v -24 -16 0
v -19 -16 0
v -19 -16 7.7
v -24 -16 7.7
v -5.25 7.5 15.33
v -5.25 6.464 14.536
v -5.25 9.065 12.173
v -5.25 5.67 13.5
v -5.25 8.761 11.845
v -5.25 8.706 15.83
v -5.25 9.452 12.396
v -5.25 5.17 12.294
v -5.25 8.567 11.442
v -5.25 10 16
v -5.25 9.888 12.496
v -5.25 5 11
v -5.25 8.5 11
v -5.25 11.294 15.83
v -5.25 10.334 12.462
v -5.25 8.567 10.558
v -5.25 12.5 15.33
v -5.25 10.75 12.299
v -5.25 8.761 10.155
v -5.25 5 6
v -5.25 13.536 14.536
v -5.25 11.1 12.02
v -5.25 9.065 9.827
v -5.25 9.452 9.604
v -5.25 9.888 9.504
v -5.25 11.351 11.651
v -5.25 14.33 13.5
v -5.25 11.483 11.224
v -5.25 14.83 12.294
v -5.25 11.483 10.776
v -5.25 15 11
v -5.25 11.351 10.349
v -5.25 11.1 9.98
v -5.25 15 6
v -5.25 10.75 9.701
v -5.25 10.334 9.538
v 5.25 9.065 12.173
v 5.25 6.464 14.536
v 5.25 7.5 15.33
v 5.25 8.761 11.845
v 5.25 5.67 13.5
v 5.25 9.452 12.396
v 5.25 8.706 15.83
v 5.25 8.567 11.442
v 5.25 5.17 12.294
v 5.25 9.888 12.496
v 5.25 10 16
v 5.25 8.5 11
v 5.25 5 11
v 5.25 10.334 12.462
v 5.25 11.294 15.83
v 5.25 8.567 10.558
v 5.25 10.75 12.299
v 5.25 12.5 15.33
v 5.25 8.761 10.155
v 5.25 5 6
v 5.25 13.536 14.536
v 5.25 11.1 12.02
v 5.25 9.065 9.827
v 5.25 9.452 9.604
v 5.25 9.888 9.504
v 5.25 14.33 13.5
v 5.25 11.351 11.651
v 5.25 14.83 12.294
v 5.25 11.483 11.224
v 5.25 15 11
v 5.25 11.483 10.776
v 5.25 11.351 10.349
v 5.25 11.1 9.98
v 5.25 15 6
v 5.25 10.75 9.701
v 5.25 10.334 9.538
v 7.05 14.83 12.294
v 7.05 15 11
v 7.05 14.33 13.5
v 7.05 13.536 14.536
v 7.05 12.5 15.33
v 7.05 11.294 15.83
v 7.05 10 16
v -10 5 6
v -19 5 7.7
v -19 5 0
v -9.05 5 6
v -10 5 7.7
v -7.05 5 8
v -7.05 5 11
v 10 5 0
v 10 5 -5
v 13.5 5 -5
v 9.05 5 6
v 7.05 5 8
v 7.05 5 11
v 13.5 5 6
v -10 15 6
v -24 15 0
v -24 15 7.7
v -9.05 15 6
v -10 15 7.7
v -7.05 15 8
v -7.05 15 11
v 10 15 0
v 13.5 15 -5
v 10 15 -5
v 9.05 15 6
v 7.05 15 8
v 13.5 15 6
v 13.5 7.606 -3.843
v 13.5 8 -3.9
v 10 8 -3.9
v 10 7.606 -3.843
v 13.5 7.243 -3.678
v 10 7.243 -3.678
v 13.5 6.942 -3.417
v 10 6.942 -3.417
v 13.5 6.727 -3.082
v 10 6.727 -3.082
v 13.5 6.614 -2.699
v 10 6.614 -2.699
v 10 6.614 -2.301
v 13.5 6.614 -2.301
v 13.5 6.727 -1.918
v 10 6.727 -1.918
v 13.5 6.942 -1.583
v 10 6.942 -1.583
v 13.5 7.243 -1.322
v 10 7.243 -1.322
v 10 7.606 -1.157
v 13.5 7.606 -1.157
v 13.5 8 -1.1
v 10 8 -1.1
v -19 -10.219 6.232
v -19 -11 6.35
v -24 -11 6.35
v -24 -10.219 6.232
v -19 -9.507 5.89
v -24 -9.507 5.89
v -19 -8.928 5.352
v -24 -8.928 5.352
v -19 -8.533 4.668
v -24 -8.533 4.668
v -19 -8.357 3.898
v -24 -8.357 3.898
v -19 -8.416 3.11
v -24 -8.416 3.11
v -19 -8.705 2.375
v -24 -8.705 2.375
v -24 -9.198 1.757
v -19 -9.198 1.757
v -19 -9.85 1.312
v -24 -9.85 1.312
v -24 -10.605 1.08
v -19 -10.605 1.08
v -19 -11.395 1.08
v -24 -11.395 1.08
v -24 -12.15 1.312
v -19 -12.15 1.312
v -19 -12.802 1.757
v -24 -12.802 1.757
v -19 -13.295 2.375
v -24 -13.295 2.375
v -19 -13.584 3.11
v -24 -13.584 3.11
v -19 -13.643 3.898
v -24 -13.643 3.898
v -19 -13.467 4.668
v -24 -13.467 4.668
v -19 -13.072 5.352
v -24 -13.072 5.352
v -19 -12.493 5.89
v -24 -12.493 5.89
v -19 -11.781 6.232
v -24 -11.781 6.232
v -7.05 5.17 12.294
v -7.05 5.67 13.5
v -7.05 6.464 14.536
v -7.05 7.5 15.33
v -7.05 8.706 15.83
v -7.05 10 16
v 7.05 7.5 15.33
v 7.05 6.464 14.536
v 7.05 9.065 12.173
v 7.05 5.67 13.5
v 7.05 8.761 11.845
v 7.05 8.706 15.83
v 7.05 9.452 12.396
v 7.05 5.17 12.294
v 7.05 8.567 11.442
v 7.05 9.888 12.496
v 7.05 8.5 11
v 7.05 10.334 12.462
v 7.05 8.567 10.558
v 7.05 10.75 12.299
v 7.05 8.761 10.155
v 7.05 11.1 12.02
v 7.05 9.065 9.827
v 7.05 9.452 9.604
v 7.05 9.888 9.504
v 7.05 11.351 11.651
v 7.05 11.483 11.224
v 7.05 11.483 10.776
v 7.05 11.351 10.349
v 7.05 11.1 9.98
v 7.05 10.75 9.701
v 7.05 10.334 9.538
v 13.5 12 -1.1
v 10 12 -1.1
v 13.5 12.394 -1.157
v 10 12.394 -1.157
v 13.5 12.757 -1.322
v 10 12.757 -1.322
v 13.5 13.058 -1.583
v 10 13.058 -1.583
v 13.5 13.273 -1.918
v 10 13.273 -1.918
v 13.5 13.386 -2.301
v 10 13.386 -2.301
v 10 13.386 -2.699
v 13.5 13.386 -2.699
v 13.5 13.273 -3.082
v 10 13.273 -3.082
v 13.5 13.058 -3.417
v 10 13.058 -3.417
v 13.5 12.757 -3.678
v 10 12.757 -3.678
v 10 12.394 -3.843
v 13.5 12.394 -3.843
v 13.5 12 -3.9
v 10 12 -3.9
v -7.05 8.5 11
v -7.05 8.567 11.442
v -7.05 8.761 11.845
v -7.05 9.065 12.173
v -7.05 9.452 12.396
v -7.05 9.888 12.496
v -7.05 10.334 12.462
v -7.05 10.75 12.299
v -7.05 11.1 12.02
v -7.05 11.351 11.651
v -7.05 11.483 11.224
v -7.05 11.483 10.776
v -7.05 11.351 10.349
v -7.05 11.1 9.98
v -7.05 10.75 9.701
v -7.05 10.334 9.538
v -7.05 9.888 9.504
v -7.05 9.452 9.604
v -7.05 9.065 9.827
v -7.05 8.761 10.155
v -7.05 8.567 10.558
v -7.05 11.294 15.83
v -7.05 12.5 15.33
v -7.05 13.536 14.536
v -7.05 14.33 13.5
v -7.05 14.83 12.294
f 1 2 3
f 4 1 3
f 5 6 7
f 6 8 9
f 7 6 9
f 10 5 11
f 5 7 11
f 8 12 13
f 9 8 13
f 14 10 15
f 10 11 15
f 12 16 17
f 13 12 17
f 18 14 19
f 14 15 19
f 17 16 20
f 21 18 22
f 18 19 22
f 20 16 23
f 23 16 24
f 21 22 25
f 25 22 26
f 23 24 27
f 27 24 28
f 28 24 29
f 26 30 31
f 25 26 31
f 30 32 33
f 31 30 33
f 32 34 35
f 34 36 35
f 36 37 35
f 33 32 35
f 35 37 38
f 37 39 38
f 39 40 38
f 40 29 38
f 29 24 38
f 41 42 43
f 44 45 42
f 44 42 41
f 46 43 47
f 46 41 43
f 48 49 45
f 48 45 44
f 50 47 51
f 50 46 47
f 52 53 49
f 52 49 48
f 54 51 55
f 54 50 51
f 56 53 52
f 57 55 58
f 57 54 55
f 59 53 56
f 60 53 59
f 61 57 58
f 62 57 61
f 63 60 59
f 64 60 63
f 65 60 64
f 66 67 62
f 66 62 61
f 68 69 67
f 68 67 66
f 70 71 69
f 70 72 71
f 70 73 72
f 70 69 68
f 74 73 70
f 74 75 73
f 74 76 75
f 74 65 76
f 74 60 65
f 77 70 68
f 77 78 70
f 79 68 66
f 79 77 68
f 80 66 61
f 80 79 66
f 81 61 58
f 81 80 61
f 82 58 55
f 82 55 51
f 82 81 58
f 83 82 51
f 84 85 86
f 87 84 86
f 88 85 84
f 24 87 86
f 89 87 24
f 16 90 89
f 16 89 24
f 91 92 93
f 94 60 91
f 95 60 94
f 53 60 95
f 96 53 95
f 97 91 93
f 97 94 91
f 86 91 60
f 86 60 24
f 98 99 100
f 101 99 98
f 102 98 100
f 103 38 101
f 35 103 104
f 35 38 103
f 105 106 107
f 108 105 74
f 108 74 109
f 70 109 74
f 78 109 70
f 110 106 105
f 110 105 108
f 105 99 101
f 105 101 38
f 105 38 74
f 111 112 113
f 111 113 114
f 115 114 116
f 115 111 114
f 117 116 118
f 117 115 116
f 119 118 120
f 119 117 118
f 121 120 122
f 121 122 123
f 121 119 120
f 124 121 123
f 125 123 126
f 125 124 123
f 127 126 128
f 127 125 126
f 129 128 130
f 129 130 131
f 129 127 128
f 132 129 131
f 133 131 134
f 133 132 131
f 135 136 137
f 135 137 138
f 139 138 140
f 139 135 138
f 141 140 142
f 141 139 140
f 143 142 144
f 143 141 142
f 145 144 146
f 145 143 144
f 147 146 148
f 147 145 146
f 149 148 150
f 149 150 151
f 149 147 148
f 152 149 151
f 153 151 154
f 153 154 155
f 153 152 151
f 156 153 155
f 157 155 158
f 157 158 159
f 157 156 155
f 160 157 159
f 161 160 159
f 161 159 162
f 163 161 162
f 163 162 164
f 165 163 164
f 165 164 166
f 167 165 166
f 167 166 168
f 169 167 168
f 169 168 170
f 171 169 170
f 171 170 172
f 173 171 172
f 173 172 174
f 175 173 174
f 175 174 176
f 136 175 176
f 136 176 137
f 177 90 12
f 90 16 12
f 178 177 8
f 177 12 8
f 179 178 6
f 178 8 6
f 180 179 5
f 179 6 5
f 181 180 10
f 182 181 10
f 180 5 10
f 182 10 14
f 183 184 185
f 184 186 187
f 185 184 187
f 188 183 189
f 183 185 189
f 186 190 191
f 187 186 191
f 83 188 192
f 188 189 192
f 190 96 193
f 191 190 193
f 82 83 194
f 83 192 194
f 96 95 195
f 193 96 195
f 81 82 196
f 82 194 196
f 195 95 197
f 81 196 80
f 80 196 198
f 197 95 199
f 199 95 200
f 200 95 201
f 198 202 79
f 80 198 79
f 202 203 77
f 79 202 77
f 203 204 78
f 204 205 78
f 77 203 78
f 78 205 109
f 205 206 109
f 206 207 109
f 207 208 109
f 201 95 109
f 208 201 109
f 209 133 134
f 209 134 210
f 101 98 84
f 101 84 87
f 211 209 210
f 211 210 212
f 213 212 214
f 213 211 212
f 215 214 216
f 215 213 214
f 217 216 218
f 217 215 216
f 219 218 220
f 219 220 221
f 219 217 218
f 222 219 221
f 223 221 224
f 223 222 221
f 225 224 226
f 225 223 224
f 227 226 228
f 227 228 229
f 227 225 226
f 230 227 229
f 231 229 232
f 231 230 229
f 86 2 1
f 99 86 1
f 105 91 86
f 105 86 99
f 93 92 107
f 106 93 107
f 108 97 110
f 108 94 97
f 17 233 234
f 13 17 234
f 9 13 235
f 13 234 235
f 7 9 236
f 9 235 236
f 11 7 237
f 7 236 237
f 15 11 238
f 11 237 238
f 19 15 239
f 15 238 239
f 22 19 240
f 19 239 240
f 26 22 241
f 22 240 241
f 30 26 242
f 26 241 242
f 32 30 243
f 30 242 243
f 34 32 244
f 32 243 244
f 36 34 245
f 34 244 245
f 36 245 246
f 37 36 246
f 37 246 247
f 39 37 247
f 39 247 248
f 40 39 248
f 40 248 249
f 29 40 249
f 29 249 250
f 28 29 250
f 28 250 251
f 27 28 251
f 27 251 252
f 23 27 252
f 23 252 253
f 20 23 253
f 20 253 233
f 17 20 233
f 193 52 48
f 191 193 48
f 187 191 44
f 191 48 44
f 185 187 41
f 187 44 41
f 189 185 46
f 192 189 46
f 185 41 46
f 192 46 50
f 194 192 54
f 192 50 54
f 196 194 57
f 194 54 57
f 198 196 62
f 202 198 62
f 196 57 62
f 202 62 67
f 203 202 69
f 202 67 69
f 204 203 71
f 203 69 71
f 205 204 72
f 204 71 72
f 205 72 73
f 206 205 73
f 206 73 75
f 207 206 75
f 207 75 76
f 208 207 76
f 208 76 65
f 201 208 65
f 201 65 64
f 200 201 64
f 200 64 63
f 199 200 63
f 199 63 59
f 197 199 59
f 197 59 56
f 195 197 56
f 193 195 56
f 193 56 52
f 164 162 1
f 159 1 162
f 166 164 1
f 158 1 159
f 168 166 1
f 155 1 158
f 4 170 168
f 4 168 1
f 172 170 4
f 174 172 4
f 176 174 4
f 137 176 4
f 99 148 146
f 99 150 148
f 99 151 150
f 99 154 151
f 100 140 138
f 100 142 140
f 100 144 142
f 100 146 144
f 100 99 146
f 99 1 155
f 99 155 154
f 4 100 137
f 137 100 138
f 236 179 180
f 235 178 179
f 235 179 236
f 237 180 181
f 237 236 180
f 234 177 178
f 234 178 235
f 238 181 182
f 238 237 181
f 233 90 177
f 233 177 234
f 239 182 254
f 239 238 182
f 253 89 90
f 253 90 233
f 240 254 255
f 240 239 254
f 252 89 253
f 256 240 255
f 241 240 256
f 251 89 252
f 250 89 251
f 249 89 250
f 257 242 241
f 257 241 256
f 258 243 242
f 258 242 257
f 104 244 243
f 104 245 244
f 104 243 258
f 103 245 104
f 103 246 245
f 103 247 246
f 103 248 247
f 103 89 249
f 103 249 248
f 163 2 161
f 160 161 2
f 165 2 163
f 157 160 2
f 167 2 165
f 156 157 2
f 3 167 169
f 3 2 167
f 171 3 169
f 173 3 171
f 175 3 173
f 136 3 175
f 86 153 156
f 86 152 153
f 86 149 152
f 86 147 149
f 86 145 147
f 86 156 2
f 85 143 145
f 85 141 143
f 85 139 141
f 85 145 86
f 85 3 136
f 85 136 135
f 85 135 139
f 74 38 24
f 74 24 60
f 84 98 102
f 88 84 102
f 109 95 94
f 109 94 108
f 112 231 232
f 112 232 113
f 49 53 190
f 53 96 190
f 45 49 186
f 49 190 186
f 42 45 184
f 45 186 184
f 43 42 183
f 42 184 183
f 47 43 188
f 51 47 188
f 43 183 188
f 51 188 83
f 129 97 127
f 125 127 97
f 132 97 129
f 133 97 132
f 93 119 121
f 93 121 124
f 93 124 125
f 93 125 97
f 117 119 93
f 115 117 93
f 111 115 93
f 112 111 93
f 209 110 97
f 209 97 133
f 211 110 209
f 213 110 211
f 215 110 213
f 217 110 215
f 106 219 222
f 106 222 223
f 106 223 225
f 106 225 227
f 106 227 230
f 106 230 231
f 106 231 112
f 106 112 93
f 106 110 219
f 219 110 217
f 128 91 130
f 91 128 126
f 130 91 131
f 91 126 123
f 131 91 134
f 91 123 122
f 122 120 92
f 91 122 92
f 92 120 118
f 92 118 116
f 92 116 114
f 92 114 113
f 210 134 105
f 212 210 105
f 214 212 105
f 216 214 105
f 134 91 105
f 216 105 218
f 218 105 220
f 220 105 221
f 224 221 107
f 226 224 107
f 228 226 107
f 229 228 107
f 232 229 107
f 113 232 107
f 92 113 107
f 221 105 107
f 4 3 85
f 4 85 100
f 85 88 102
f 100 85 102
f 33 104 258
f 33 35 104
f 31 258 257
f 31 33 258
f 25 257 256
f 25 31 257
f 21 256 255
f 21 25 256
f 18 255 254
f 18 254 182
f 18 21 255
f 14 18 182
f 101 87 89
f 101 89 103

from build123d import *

# Parameters (mm, degrees)
SKETCH1_W           = 20
SKETCH1_H           = 30
SKETCH1_R           = 2.65
BOSS_EXTRUDE1_DEPTH = 3
SKETCH2_W           = 20
SKETCH2_H           = 10
BOSS_EXTRUDE2_DEPTH = 3
SKETCH3_W           = 1.8
SKETCH3_H           = 10
BOSS_EXTRUDE3_DEPTH = 10
FILLET1_R           = 5
CUT_EXTRUDE1_REACH  = 29.78
SKETCH4_R           = 1.5
CHAMFER1_SIZE       = 2
SKETCH5_W           = 20
SKETCH5_H           = 20
CUT_EXTRUDE2_DEPTH  = 10
SKETCH6_W           = 11
SKETCH6_H           = 10
BOSS_EXTRUDE4_DEPTH = 3.5
CUT_EXTRUDE3_DEPTH  = 3.5
SKETCH8_W           = 7.7
SKETCH8_H           = 31
SKETCH8_R           = 2.65
BOSS_EXTRUDE5_DEPTH = 14
SKETCH9_W           = 9
SKETCH9_H           = 21
CUT_EXTRUDE4_DEPTH  = 10


with BuildPart() as part:
    # Sketch1 → Boss-Extrude1 (new body)
    with BuildSketch(Plane.XY):
        Rectangle(SKETCH1_W, SKETCH1_H)
        with Locations((0, -10)):
            Circle(SKETCH1_R, mode=Mode.SUBTRACT)
        Circle(SKETCH1_R, mode=Mode.SUBTRACT)
    extrude(amount=BOSS_EXTRUDE1_DEPTH)

    # Sketch2 → Boss-Extrude2 (add)
    with BuildSketch(Plane.XY.offset(3)):
        with Locations((0, 10)):
            Rectangle(SKETCH2_W, SKETCH2_H)
    extrude(amount=BOSS_EXTRUDE2_DEPTH)

    # Sketch3 → Boss-Extrude3 (add)
    with BuildSketch(Plane.XY.offset(6)):
        with Locations((-6.15, 10)):
            Rectangle(SKETCH3_W, SKETCH3_H)
        with Locations((6.15, 10)):
            Rectangle(SKETCH3_W, SKETCH3_H)
    extrude(amount=BOSS_EXTRUDE3_DEPTH)

    # Fillet1
    fillet1_edges = [part.edges().sort_by_distance(p)[0] for p in [
        (6.15, 5, 16),
        (-6.15, 5, 16),
        (6.15, 15, 16),
        (-6.15, 15, 16),
    ]]
    fillet(fillet1_edges, radius=FILLET1_R - 0.0001)  # a hair under: the kernel refuses the full size

    # Cut-Extrude1: up to this face of the body (flat: up to its plane)
    cut_extrude1_end = Plane(part.part.faces().sort_by_distance((7.05, 10, 10.533268934))[0])
    # Sketch4 → Cut-Extrude1 (cut, up to the picked face)
    with BuildSketch(Plane.ZY.offset(7.05), mode=Mode.PRIVATE) as cut_extrude1_sk1:
        with Locations(Location((11, 10, 0), (0, 0, 270))):
            Circle(SKETCH4_R)
    cut_extrude1_tool1 = split(extrude(cut_extrude1_sk1.sketch, amount=-CUT_EXTRUDE1_REACH, mode=Mode.PRIVATE), bisect_by=cut_extrude1_end, keep=Keep.BOTH, mode=Mode.PRIVATE)
    add(cut_extrude1_tool1.solids().sort_by(Axis((-7.05, 10, 11), (1, 0, 0)))[0], mode=Mode.SUBTRACT)

    # Chamfer1
    chamfer1_edges = [part.edges().sort_by_distance(p)[0] for p in [
        (-7.05, 10, 6),
        (7.05, 10, 6),
    ]]
    chamfer(chamfer1_edges, length=CHAMFER1_SIZE)

    # Sketch5 → Cut-Extrude2 (cut)
    with BuildSketch(Plane.XY.offset(3)):
        with Locations((0, -5)):
            Rectangle(SKETCH5_W, SKETCH5_H)
    extrude(amount=-CUT_EXTRUDE2_DEPTH, mode=Mode.SUBTRACT)

    # Sketch6 → Boss-Extrude4 (add)
    with BuildSketch(Plane(origin=(10, 0, 0), x_dir=(0, 0, -1), z_dir=(1, 0, 0))):
        with Locations((-0.5, 10)):
            Rectangle(SKETCH6_W, SKETCH6_H)
    extrude(amount=BOSS_EXTRUDE4_DEPTH)

    # Sketch7 → Cut-Extrude3 (cut)
    with BuildSketch(Plane(origin=(13.5, 0, 0), x_dir=(0, 0, -1), z_dir=(1, 0, 0))):
        with BuildLine():
            Line((1.1, 8), (1.1, 12))
            ThreePointArc((1.1, 12), (2.5, 13.4), (3.9, 12))
            Line((3.9, 12), (3.9, 8))
            ThreePointArc((3.9, 8), (2.5, 6.6), (1.1, 8))
        make_face()
    extrude(amount=-CUT_EXTRUDE3_DEPTH, mode=Mode.SUBTRACT)

    # Sketch8 → Boss-Extrude5 (add)
    with BuildSketch(Plane.ZY.offset(10)):
        with Locations((3.85, -0.5)):
            Rectangle(SKETCH8_W, SKETCH8_H)
        with Locations((3.7, -11)):
            Circle(SKETCH8_R, mode=Mode.SUBTRACT)
    extrude(amount=BOSS_EXTRUDE5_DEPTH)

    # Sketch9 → Cut-Extrude4 (cut)
    with BuildSketch(Plane.XY.offset(7.7)):
        with Locations((-14.5, -5.5)):
            Rectangle(SKETCH9_W, SKETCH9_H)
    extrude(amount=-CUT_EXTRUDE4_DEPTH, mode=Mode.SUBTRACT)


solid = part.part
